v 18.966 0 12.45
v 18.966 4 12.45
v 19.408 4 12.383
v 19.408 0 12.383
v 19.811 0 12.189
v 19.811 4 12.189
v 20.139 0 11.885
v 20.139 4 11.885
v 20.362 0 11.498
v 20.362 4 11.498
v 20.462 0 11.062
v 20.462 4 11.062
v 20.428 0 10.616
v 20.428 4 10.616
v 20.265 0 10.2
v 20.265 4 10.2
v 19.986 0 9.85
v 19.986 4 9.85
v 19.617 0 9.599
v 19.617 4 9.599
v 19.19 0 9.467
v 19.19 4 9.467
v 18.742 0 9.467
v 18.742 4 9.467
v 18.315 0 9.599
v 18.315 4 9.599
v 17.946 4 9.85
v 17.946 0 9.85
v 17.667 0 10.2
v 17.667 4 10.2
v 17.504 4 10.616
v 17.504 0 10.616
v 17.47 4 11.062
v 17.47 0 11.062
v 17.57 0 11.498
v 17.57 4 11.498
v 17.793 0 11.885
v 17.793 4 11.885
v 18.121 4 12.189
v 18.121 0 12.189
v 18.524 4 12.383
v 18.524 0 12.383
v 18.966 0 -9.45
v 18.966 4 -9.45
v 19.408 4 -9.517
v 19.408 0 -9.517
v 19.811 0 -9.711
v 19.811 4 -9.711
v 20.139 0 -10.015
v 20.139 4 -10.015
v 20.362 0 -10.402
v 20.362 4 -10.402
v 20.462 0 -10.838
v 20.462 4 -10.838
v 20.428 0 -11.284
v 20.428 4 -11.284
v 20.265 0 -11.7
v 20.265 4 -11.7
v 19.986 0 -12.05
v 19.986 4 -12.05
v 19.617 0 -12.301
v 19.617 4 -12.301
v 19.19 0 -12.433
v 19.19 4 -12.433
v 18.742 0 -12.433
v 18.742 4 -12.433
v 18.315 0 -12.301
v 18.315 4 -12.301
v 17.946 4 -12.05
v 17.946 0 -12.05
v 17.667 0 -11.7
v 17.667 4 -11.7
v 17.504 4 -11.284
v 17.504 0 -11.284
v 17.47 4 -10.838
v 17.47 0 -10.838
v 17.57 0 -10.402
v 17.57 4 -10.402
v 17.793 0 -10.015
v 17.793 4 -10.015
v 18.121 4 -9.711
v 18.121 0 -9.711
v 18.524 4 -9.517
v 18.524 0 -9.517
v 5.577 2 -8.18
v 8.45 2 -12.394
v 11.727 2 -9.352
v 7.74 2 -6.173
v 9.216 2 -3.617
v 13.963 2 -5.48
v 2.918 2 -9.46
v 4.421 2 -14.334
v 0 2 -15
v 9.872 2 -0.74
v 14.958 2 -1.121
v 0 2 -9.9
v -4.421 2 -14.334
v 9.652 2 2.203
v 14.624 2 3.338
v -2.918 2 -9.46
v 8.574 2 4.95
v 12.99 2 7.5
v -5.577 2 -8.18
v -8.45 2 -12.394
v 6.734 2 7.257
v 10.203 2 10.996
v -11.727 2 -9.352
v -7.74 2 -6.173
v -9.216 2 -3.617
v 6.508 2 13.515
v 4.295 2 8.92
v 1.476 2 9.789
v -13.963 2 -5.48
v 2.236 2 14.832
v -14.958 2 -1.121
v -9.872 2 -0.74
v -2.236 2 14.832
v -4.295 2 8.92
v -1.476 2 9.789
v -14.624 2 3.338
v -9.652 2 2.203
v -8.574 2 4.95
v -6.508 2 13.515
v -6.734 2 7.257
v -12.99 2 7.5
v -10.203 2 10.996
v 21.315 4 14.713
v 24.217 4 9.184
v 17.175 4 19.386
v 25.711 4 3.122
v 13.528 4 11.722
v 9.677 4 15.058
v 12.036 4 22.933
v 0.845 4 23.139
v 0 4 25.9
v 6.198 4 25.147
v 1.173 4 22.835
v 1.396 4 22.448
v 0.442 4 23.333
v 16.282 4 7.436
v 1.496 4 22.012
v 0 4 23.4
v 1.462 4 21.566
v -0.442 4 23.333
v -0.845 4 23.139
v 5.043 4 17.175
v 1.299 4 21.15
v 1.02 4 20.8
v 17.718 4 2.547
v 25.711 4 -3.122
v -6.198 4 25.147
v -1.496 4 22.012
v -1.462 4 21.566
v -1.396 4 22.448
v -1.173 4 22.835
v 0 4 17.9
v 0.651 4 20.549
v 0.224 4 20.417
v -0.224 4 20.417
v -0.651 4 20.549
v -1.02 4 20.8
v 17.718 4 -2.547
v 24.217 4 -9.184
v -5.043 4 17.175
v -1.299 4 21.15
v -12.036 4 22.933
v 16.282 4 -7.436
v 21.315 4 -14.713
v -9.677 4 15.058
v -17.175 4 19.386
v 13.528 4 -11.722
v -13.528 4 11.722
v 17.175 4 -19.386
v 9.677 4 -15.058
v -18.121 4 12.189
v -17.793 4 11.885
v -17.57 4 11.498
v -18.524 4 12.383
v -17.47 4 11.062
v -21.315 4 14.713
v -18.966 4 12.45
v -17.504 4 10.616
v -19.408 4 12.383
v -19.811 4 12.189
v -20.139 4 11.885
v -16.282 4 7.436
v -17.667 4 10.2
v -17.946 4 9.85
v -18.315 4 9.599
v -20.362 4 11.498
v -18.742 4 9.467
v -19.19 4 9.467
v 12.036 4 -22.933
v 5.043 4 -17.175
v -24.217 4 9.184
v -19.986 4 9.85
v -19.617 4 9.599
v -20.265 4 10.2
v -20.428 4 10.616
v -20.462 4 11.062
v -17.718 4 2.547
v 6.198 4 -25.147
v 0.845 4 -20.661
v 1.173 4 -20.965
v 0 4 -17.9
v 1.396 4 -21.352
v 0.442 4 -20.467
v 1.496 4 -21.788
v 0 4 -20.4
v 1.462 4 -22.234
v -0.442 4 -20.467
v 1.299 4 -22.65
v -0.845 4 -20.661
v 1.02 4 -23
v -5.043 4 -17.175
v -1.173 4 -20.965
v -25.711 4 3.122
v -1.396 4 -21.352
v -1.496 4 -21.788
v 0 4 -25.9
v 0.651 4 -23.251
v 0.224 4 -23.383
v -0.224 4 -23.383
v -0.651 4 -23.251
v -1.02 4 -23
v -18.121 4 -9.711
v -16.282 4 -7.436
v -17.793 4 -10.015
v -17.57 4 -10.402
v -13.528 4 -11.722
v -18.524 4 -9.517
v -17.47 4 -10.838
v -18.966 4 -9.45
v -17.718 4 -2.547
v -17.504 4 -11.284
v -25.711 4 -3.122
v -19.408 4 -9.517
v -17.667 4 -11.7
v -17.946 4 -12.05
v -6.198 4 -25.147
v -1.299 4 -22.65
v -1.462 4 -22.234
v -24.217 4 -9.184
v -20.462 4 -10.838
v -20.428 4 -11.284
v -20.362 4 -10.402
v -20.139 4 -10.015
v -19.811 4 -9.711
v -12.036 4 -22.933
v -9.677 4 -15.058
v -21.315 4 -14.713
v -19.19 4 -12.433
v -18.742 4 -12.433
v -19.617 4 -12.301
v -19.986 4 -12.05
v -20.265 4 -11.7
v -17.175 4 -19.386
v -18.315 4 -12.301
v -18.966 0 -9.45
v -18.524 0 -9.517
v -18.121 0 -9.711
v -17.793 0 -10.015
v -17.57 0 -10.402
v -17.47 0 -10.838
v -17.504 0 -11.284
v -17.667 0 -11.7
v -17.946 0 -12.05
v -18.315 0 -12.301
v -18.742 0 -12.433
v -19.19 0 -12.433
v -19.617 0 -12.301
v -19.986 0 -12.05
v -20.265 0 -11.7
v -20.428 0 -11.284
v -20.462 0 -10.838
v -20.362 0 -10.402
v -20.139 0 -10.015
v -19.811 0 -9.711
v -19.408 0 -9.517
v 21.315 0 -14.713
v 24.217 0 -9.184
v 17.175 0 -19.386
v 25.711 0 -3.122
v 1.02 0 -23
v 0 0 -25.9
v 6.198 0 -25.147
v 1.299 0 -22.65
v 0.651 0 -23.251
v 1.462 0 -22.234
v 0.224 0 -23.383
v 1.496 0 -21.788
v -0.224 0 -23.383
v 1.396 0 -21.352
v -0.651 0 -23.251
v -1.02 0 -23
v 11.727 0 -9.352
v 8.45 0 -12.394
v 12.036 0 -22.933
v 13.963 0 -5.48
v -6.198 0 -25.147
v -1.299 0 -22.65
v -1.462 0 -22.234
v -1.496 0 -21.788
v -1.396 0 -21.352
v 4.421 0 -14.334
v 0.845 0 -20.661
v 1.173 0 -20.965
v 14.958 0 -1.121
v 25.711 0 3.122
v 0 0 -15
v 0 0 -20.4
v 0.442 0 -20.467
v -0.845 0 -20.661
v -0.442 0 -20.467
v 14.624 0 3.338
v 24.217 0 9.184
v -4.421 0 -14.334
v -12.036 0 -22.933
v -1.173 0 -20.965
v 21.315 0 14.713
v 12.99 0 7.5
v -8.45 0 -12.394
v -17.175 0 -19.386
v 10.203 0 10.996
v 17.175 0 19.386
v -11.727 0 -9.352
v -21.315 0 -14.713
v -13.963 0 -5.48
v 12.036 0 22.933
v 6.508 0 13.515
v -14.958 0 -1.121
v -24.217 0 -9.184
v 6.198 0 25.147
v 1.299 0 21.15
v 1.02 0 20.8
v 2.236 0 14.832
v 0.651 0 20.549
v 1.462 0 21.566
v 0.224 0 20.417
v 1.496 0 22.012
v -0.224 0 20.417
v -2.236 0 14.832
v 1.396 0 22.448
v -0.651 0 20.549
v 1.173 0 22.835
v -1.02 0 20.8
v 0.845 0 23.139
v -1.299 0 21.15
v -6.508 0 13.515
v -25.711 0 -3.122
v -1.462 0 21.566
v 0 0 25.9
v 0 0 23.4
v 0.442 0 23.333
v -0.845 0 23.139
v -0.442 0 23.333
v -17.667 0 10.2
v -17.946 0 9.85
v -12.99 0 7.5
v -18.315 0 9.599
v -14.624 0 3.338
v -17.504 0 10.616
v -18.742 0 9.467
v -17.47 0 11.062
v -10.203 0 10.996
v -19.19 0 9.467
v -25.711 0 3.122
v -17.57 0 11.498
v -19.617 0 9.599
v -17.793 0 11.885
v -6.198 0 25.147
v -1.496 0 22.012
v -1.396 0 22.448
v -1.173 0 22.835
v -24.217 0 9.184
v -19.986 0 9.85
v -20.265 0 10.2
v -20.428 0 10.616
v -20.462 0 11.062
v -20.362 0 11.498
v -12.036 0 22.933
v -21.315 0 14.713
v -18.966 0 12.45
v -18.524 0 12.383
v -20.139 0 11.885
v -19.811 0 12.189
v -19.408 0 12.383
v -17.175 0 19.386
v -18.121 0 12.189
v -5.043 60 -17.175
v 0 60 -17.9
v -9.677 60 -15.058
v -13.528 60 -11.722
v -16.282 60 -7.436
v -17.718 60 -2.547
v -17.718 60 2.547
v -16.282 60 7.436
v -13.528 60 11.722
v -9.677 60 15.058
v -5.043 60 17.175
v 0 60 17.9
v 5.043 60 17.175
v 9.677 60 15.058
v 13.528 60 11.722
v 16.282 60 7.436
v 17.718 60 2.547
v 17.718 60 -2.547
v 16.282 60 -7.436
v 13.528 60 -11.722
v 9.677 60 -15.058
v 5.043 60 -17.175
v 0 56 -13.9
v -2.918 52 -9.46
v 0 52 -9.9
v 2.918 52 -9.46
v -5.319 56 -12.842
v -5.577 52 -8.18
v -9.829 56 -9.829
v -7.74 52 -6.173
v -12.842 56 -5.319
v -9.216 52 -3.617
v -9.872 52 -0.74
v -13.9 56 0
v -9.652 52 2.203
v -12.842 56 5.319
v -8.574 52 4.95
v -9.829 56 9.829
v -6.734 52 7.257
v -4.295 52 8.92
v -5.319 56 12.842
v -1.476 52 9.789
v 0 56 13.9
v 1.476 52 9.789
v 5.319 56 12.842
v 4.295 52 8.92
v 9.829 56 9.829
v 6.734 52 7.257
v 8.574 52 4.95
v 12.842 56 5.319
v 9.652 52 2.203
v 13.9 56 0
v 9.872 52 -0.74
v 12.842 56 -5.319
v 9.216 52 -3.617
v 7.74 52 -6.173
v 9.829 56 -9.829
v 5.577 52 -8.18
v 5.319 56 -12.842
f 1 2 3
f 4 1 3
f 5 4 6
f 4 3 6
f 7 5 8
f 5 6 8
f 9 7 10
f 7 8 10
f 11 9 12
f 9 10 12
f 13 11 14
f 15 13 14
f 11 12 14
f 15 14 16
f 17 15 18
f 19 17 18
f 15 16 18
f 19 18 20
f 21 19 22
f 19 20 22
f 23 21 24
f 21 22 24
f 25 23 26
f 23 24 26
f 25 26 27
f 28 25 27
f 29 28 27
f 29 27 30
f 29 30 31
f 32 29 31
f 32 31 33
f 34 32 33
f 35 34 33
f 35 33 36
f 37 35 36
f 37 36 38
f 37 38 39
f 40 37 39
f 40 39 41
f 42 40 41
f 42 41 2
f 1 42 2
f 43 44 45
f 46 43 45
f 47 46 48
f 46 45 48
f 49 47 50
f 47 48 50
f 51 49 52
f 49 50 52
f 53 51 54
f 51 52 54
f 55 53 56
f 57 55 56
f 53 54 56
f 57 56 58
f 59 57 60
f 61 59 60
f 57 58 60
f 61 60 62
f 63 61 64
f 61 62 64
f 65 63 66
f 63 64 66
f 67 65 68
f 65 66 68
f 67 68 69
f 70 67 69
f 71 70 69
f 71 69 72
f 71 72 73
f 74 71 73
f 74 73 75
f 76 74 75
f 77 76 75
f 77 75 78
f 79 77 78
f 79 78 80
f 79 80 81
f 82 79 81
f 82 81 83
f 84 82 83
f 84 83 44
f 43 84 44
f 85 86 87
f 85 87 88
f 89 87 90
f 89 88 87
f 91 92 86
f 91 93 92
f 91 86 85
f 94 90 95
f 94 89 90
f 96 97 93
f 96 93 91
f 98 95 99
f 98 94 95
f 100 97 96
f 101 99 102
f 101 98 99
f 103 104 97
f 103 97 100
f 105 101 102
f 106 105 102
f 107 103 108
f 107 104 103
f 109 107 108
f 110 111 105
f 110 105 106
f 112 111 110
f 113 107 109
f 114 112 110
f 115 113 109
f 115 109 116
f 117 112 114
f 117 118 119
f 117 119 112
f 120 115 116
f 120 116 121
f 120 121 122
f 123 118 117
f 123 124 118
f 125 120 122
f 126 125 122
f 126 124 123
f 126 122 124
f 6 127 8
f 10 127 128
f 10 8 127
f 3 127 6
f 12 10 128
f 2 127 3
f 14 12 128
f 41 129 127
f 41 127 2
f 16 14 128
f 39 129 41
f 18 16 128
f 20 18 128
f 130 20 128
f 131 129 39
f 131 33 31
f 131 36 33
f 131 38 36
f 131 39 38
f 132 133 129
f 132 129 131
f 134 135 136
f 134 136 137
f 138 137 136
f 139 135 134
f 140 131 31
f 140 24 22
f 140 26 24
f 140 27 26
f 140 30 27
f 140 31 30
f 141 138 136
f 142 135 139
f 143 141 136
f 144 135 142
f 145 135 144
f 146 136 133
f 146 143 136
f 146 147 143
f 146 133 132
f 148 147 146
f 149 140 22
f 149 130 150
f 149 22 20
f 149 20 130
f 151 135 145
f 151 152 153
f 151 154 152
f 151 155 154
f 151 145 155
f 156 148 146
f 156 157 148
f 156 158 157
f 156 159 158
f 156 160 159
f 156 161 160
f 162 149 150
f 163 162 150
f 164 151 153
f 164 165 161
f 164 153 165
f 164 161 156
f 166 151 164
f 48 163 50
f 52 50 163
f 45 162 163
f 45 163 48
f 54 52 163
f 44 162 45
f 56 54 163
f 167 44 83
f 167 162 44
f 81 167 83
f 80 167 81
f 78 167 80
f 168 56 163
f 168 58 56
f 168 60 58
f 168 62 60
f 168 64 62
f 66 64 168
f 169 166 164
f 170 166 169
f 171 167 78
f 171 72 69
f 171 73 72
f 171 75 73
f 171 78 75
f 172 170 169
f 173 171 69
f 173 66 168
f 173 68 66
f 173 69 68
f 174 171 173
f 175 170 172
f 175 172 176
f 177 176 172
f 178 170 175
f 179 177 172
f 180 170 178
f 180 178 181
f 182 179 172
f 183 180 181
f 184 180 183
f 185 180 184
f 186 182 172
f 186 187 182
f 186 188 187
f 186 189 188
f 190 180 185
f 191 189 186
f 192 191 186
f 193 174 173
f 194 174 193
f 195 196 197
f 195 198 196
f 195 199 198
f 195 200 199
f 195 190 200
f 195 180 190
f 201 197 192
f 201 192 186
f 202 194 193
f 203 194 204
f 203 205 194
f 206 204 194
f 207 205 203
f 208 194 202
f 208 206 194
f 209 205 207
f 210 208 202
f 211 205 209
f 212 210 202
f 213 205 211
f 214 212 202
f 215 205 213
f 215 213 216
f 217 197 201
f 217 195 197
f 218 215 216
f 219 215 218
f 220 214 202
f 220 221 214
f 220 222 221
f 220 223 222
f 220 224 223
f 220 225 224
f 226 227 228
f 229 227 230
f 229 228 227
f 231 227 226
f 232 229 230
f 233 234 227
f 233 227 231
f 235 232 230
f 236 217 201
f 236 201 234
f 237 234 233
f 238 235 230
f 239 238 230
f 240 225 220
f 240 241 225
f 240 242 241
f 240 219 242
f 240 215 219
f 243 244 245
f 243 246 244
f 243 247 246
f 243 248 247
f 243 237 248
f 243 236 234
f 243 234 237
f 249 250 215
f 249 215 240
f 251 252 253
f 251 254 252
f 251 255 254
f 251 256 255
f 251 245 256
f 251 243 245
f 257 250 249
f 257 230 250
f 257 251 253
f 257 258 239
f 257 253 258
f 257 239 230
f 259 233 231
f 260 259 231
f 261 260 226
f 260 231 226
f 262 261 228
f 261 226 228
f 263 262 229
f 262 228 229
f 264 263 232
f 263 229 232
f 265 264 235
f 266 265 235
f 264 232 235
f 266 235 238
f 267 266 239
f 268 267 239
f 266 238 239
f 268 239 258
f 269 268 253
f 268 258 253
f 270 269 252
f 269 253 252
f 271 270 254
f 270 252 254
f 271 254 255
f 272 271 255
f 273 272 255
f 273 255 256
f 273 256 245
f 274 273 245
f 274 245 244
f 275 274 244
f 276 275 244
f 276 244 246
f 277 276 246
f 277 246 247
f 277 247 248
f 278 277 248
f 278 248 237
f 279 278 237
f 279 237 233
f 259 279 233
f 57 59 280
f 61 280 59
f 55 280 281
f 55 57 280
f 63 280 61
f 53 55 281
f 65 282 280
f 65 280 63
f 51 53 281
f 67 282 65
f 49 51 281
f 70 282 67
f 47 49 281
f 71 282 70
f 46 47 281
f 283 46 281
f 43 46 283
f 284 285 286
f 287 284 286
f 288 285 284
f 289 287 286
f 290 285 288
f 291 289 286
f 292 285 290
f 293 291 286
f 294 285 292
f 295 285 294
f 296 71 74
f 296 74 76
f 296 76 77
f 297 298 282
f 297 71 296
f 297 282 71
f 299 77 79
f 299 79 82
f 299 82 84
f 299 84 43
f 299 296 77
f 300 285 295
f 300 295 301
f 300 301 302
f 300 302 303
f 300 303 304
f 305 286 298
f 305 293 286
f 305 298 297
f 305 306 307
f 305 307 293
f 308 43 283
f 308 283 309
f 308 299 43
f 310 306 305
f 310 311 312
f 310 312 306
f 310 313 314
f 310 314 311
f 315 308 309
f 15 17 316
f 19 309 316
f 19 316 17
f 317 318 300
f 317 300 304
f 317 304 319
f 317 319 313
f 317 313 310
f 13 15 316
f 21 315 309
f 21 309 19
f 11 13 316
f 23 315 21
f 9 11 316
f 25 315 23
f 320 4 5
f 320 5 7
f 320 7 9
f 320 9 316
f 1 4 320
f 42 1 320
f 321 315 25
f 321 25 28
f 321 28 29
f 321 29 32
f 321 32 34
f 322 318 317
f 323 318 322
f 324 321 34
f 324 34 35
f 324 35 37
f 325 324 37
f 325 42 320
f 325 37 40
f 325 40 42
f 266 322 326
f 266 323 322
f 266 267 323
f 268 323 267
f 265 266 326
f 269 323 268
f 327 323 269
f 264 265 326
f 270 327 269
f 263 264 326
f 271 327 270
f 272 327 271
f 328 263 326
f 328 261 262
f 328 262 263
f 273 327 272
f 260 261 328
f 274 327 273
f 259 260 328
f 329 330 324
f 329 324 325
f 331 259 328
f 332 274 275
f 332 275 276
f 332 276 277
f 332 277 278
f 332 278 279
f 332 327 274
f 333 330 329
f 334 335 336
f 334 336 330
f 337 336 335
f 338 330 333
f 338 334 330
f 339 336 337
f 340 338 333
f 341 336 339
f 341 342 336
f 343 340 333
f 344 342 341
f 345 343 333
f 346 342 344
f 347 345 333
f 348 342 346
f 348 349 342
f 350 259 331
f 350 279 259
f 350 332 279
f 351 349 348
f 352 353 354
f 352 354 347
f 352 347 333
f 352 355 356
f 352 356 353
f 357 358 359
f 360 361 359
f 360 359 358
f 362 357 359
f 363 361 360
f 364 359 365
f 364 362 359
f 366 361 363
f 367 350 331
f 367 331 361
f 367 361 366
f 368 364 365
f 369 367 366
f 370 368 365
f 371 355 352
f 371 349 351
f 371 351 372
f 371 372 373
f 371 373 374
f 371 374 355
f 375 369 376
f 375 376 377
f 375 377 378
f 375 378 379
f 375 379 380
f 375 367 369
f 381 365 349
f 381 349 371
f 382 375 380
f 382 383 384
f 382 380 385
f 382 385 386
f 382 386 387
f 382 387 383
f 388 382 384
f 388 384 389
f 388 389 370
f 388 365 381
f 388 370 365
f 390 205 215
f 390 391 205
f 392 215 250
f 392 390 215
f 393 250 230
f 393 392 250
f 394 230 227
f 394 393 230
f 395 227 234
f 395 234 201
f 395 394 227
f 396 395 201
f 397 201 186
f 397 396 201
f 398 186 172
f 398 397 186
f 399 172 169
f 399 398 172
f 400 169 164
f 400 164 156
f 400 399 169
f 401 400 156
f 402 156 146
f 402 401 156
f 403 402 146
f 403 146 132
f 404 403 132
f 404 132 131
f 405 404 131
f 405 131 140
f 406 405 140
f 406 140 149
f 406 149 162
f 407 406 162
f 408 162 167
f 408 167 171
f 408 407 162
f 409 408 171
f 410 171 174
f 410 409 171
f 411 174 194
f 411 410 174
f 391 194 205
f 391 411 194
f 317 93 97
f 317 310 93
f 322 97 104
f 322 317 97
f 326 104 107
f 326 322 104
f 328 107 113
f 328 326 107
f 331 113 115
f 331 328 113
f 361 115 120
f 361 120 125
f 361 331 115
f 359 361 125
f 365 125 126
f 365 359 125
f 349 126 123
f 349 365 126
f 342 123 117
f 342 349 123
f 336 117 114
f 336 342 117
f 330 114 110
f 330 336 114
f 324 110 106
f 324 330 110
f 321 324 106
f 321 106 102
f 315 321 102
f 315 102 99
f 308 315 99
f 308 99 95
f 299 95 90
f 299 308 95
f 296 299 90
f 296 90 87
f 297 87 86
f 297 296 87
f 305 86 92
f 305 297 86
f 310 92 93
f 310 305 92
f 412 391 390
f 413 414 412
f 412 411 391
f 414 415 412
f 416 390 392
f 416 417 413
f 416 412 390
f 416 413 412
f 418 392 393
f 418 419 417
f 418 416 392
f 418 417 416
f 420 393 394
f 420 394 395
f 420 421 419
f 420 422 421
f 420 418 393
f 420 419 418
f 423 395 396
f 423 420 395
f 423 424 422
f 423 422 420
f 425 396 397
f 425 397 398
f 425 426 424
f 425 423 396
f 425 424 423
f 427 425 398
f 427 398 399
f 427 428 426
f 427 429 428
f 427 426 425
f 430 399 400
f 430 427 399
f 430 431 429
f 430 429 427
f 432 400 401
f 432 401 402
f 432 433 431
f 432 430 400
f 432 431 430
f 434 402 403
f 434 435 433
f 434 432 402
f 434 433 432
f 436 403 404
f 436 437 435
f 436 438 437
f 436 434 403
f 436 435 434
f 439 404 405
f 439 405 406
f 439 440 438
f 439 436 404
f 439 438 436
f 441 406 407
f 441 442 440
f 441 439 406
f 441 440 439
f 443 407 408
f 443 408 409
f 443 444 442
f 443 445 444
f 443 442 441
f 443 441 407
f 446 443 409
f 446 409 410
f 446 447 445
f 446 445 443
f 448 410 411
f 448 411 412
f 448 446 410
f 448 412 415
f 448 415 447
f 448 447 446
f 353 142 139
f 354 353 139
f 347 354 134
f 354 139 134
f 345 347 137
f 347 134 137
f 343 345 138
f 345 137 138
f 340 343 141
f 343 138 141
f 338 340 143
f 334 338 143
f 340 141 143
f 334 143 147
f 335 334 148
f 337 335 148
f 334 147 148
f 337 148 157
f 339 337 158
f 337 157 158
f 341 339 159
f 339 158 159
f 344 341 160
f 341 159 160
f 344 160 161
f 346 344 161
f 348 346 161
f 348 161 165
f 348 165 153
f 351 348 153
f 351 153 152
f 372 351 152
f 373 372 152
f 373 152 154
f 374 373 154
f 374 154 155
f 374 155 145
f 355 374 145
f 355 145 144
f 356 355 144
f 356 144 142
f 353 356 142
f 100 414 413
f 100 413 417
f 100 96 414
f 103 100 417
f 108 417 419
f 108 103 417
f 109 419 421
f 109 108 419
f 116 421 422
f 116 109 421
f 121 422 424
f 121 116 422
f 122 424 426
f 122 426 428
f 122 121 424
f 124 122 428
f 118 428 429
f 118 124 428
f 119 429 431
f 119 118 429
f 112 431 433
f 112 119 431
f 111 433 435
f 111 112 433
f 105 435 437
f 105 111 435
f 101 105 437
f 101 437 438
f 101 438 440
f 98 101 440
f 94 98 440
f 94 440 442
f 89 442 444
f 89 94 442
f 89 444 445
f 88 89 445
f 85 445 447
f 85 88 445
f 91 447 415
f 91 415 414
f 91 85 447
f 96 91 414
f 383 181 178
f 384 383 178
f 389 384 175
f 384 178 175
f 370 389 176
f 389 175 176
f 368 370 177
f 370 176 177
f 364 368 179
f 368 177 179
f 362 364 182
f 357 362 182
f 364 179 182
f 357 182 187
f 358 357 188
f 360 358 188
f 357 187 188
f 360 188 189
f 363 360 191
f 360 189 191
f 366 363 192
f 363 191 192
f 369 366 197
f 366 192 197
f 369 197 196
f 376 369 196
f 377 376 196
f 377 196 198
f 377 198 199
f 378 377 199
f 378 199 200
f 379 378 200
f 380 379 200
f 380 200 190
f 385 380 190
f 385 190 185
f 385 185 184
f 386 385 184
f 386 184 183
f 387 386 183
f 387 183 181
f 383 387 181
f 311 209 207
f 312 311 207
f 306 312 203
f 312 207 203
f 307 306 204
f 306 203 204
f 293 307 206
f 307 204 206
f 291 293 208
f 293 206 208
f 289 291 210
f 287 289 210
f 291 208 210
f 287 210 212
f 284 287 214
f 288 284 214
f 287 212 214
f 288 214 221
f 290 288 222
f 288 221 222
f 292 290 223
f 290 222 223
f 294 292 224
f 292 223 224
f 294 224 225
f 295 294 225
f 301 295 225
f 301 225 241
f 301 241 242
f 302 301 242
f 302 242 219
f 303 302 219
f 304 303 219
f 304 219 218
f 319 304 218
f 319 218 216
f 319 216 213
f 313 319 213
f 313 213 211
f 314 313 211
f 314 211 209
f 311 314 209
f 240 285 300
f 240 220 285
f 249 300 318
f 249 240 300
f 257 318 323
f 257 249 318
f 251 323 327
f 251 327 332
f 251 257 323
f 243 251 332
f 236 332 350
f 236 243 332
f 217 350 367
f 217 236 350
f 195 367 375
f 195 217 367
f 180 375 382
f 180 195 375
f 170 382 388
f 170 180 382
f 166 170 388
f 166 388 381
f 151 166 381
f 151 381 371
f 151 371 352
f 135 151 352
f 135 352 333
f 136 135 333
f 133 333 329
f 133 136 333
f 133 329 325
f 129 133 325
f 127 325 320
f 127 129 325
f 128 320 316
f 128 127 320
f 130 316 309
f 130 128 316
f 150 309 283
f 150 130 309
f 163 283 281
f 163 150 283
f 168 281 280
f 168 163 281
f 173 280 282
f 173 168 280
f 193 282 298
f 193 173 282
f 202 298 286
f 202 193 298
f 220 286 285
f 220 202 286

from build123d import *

# Parameters (mm, degrees)
SKETCH_2_R          = 1.5
CUT_EXTRUDE_1_DEPTH = 10


with BuildPart() as part:
    # Эскиз1 → Повернуть1 (revolve)
    with BuildSketch(Plane(origin=(0, 0, 0), x_dir=(0, 0, -1), z_dir=(1, 0, 0))):
        Polygon((9.9, 52), (9.9, 2), (15, 2), (15, 0), (25.9, 0), (25.9, 4), (17.9, 4), (17.9, 60), align=None)
    revolve(axis=Axis((0, 0, 0), (0, 1, 0)))

    # Эскиз2 → Вырез-Вытянуть1 (cut)
    with BuildSketch(Plane(origin=(0, 4, 0), x_dir=(1, 0, 0), z_dir=(0, 1, 0))):
        with Locations(Location((0, 21.9, 0), (0, 0, 270))):
            Circle(SKETCH_2_R)
        with Locations(Location((18.965956343, 10.95, 0), (0, 0, 270))):
            Circle(SKETCH_2_R)
        with Locations(Location((18.965956343, -10.95, 0), (0, 0, 270))):
            Circle(SKETCH_2_R)
        with Locations(Location((0, -21.9, 0), (0, 0, 270))):
            Circle(SKETCH_2_R)
        with Locations(Location((-18.965956343, -10.95, 0), (0, 0, 270))):
            Circle(SKETCH_2_R)
        with Locations(Location((-18.965956343, 10.95, 0), (0, 0, 270))):
            Circle(SKETCH_2_R)
    extrude(amount=-CUT_EXTRUDE_1_DEPTH, mode=Mode.SUBTRACT)


solid = part.part
